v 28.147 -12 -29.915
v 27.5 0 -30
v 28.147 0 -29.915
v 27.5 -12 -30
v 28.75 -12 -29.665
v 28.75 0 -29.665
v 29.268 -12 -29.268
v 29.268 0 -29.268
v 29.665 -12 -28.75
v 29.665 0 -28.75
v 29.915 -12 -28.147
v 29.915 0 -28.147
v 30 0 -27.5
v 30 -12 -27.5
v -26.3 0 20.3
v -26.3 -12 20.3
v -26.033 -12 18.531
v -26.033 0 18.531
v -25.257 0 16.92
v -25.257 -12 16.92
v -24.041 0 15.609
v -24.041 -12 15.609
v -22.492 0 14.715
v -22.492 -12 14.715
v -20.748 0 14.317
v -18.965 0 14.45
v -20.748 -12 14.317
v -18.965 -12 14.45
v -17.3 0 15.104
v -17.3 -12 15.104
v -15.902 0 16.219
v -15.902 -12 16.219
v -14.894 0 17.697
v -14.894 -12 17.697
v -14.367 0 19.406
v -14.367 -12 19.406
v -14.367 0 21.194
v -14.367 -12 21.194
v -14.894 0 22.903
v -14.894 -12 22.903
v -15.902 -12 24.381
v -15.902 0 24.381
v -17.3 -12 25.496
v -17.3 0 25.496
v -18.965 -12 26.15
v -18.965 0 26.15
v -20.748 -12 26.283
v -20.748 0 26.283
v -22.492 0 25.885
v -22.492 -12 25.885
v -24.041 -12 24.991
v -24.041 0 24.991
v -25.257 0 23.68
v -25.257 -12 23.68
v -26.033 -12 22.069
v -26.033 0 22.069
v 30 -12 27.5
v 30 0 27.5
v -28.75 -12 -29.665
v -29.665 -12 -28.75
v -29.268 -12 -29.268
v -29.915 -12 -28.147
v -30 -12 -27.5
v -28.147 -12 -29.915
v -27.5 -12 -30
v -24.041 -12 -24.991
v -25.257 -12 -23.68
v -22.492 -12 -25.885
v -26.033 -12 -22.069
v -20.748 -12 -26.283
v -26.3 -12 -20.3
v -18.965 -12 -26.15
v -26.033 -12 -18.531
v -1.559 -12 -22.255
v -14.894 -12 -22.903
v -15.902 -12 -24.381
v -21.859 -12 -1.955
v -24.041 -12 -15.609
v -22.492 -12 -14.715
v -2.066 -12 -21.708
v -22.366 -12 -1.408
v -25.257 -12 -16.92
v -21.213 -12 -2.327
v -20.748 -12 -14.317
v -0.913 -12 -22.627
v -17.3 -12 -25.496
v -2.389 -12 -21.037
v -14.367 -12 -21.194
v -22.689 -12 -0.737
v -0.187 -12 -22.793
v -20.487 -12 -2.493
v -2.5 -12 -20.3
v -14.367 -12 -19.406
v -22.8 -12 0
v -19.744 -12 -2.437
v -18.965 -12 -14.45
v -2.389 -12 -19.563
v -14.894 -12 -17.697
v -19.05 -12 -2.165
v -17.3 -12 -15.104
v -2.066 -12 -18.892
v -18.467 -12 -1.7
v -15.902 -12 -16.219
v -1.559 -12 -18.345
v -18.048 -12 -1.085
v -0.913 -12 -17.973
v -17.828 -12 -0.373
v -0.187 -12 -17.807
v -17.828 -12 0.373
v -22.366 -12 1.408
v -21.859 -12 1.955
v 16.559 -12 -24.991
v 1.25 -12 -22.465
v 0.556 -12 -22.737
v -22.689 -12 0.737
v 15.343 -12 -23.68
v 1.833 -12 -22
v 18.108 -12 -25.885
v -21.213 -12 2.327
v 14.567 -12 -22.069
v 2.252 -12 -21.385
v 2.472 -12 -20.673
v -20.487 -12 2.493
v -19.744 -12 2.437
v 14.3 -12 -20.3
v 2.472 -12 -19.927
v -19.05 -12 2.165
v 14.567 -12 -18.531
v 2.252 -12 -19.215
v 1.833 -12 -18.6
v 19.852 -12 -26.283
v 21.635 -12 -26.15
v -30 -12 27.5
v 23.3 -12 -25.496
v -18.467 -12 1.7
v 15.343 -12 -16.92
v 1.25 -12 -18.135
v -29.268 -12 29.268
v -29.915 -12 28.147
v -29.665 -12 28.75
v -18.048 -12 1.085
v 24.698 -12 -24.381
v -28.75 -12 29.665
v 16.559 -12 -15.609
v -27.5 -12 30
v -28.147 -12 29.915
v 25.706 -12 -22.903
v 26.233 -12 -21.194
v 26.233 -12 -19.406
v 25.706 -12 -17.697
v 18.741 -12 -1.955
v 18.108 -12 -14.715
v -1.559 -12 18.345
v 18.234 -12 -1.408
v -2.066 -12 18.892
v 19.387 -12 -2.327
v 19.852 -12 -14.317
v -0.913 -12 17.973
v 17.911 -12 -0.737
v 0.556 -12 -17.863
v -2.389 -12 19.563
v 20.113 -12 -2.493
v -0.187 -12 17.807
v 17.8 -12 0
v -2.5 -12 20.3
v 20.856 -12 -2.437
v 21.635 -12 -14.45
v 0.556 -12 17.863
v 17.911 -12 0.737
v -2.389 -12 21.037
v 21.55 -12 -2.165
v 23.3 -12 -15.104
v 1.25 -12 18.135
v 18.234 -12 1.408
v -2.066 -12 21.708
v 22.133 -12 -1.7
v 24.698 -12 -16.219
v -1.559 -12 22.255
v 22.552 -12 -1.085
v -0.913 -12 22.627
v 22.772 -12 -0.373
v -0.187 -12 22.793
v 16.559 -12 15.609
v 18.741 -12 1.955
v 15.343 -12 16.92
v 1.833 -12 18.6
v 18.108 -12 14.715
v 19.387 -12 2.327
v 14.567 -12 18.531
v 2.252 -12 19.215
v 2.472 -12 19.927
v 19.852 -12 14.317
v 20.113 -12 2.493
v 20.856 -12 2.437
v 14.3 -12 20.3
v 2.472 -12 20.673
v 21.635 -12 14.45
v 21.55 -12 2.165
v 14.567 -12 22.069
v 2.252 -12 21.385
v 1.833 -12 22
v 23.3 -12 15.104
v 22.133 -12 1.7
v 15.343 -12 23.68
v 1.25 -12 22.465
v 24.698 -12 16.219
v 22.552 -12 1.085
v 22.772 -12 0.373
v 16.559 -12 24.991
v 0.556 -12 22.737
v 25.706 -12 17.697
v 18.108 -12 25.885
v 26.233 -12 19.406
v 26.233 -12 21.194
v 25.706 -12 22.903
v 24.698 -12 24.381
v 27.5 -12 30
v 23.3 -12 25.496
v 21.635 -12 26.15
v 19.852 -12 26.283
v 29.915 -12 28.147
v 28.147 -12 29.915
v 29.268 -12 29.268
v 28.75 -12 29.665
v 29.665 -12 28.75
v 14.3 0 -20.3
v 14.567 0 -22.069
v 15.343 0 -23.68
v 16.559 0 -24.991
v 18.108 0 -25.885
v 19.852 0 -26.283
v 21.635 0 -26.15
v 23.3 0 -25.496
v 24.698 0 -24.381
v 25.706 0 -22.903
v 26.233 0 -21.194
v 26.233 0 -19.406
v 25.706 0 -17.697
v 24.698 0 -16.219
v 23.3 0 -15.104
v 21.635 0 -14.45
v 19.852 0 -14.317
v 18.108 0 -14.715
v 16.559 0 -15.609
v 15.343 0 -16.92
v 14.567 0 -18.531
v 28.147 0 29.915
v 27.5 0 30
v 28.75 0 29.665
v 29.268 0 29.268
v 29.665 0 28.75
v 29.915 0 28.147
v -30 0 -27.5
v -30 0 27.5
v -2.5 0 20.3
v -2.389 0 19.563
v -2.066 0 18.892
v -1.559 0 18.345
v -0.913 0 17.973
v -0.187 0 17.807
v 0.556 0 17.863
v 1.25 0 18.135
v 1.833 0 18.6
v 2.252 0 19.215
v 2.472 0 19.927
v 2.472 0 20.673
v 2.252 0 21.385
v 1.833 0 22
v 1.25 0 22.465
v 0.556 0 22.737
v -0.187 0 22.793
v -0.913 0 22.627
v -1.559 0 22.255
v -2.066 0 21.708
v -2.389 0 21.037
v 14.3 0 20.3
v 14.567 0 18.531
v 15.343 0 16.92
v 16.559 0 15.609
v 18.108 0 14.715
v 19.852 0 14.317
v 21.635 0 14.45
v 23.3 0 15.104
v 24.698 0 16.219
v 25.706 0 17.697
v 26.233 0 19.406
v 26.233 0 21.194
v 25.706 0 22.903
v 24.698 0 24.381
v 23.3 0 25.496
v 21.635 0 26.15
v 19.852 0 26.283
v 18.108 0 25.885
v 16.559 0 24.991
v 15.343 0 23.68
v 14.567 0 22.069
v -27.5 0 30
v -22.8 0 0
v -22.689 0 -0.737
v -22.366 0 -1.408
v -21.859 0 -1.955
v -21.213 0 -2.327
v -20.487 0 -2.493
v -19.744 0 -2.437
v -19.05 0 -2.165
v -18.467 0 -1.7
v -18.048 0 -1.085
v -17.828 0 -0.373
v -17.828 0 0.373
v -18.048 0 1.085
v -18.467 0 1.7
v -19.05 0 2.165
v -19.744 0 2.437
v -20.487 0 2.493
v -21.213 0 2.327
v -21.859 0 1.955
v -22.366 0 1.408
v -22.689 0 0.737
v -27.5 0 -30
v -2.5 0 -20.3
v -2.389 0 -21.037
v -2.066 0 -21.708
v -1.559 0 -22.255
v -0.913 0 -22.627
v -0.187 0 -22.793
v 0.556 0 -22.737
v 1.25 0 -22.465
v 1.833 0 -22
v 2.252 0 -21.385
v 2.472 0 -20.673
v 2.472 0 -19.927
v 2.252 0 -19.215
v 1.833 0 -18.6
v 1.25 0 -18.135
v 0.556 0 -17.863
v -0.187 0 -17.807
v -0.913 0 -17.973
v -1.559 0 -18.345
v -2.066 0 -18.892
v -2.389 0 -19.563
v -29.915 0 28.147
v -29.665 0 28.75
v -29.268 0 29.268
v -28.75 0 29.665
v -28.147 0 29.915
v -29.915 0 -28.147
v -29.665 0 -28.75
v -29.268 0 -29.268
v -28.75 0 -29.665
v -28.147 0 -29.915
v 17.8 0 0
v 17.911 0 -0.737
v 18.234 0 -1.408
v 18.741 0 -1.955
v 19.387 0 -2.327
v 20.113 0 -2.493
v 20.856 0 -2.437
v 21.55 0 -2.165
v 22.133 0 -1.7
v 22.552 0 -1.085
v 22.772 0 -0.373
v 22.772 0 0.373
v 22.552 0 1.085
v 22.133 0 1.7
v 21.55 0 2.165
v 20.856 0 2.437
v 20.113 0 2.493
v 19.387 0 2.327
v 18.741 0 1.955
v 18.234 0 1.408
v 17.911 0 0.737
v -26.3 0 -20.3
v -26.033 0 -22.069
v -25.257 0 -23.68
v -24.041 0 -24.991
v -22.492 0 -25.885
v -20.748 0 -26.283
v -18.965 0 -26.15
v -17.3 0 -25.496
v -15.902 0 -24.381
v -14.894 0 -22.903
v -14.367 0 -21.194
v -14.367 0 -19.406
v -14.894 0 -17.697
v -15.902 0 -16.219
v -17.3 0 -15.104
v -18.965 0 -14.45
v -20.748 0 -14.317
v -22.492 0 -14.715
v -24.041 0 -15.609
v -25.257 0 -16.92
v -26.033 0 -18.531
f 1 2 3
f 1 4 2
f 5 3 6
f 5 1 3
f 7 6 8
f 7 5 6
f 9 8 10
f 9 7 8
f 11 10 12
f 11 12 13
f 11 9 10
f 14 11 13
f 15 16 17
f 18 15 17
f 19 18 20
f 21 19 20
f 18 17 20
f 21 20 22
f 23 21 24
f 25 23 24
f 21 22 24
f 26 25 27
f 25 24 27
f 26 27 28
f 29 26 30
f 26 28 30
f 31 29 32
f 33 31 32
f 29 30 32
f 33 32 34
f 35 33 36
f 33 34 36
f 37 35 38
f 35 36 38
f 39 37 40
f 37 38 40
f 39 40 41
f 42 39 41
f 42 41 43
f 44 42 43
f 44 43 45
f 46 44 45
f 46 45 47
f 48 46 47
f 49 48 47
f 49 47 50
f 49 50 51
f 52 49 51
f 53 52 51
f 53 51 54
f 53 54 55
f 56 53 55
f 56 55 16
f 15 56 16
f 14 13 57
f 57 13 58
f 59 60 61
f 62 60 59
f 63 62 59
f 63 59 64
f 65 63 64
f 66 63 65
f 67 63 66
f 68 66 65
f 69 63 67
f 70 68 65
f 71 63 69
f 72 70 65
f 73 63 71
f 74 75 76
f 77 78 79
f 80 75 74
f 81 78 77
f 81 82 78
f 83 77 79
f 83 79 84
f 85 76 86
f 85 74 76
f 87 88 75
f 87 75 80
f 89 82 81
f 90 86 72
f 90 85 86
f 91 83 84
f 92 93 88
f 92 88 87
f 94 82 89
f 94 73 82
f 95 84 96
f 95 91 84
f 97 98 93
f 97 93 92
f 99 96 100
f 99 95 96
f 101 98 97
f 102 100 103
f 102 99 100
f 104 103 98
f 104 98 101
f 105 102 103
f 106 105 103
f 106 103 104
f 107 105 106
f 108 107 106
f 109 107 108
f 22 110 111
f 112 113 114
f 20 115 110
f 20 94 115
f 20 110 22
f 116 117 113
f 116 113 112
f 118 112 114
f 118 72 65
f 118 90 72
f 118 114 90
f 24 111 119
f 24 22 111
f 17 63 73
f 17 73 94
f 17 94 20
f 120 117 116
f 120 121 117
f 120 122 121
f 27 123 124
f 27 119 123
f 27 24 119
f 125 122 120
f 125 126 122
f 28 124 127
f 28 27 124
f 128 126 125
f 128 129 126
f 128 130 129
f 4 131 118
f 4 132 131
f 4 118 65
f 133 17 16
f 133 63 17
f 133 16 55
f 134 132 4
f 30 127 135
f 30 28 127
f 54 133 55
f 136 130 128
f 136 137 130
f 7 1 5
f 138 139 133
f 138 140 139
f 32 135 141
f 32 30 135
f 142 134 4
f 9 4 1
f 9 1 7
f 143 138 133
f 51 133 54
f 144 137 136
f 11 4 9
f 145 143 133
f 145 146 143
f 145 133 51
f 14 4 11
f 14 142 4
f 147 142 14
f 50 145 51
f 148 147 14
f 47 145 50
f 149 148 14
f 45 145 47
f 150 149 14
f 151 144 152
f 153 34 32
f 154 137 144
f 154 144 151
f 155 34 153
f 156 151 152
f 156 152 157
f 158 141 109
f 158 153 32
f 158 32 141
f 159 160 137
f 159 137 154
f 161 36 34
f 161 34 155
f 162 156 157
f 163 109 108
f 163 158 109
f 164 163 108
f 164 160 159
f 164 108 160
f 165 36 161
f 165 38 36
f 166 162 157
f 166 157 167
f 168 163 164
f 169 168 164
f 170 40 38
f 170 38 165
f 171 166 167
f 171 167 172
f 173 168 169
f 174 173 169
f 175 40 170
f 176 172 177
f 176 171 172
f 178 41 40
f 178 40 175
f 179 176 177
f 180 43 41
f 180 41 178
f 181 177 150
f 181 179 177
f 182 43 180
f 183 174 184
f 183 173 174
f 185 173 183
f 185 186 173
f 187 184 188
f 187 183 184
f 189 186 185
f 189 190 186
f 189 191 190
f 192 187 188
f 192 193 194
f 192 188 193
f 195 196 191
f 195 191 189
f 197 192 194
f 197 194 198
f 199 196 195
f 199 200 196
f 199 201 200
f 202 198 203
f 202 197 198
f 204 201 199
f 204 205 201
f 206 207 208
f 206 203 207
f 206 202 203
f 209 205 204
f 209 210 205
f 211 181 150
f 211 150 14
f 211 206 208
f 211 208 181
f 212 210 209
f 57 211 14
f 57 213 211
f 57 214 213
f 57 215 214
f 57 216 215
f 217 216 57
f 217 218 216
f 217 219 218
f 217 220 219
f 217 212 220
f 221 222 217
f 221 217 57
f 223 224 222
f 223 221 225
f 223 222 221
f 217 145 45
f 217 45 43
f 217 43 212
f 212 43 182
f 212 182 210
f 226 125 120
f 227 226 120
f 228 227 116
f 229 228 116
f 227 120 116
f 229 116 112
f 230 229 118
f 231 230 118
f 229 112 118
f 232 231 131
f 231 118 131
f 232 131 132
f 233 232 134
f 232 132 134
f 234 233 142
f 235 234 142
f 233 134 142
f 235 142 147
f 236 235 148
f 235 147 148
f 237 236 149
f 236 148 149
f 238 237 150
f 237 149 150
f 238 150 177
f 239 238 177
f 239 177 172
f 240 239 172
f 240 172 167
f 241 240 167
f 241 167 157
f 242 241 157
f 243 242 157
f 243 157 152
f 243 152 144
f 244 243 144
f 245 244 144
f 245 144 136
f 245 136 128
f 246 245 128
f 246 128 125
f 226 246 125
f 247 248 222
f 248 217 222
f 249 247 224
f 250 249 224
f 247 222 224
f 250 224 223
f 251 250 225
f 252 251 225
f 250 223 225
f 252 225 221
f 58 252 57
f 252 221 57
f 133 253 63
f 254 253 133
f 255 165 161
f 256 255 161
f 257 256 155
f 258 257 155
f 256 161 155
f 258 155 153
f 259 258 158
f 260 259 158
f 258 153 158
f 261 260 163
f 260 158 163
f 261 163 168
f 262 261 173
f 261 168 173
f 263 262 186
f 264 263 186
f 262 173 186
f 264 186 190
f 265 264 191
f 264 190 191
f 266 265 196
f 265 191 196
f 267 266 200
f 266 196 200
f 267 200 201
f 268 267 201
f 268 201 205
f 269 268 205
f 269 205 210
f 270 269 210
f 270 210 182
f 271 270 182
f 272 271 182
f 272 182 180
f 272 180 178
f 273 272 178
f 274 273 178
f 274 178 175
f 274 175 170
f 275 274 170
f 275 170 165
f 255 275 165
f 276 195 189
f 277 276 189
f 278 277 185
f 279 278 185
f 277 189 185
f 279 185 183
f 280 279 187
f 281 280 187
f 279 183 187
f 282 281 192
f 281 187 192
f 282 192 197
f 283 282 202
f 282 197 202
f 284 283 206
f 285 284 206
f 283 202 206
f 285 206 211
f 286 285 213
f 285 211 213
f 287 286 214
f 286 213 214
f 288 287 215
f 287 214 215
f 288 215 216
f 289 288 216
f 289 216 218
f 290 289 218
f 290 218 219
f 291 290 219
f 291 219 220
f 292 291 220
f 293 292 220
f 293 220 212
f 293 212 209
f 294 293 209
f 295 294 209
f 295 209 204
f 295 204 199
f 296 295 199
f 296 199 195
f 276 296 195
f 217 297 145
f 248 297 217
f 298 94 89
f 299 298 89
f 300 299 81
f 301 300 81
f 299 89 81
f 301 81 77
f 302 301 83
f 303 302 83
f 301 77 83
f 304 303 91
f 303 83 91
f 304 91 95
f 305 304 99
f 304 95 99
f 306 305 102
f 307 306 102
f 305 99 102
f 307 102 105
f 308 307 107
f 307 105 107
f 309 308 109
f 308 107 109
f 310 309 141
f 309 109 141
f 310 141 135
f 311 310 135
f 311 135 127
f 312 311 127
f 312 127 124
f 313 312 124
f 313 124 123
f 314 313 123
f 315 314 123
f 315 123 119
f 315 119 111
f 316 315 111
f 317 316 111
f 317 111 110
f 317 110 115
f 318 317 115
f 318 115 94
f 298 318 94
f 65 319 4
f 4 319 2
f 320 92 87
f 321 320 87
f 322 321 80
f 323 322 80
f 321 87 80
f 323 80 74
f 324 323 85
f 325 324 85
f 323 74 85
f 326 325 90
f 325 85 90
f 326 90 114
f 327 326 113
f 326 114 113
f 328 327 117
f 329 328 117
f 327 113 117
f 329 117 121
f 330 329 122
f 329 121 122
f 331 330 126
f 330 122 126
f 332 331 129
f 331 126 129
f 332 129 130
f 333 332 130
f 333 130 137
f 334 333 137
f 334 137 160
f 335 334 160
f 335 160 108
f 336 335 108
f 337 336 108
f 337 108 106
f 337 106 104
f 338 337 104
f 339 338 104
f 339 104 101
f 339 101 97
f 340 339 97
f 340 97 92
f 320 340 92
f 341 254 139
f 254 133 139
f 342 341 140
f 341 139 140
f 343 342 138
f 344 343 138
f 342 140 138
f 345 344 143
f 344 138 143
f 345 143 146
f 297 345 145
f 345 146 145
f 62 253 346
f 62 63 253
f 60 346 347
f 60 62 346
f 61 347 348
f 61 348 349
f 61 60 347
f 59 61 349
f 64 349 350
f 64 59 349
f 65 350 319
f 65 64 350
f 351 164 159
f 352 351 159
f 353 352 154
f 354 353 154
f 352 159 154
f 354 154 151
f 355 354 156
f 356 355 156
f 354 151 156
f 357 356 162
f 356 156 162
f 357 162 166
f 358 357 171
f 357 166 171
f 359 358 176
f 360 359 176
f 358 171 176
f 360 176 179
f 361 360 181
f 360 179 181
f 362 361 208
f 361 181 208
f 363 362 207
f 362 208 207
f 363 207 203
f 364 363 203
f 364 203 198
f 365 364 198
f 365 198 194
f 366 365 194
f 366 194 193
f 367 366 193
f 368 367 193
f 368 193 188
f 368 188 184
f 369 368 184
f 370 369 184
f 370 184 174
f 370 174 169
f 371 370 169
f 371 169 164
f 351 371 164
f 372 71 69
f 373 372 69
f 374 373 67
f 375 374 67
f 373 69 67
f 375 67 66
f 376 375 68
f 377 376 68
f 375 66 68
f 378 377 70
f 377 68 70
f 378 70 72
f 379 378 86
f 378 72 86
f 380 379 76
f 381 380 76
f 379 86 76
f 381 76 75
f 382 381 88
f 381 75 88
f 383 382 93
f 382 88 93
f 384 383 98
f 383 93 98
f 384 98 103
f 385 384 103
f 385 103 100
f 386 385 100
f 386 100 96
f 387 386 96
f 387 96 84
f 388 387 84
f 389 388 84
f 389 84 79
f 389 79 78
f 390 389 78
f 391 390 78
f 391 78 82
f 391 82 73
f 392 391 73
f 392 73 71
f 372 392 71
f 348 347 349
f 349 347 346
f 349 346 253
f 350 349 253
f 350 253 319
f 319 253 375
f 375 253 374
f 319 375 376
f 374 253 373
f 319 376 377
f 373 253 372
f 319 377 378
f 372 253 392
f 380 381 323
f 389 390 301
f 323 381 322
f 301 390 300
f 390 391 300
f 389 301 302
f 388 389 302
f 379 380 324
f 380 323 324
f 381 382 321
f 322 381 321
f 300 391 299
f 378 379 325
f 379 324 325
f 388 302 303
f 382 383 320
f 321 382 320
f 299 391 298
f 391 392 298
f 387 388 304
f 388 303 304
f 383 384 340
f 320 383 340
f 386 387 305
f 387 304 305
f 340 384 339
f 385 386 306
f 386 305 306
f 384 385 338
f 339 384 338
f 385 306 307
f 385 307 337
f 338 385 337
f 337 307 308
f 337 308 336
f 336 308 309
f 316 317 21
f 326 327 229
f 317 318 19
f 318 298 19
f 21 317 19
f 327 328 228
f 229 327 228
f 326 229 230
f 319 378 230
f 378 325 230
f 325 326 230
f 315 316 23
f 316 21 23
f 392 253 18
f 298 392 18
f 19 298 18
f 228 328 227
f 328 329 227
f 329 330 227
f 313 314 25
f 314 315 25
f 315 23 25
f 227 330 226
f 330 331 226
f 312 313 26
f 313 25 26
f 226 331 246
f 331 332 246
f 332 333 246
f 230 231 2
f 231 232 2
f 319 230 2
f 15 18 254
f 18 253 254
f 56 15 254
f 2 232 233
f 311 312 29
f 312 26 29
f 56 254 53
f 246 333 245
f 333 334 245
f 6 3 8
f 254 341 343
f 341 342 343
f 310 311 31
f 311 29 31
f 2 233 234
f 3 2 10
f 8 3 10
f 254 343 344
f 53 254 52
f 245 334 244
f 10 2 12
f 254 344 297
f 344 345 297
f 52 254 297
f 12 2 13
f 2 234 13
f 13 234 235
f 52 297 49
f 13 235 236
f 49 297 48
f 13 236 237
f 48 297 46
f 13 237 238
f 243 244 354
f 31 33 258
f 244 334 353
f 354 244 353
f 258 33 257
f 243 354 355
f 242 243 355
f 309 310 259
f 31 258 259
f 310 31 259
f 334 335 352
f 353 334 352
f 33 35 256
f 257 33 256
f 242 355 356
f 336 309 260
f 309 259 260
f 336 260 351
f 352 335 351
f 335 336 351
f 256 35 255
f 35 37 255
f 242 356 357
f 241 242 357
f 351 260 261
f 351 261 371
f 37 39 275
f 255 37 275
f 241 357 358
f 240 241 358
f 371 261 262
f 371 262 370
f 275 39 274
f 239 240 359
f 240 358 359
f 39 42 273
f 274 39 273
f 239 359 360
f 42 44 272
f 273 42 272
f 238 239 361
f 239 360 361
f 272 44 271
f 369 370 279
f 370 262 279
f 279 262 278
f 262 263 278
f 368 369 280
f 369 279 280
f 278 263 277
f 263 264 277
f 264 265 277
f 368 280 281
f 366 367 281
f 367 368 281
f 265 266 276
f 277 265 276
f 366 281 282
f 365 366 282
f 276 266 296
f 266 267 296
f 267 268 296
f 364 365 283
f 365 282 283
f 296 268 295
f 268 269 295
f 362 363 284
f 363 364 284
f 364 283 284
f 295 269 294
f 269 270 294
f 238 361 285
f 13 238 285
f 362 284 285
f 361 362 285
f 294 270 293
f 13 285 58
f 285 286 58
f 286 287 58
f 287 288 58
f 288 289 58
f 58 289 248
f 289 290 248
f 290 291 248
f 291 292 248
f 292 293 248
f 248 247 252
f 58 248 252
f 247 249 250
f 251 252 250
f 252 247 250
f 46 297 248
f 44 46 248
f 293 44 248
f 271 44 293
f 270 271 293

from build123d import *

# Parameters (mm, degrees)
F0_W     = 60
F0_H     = 60
F1_DEPTH = 12
F2_D     = 5
F3_D     = 12
F4_R     = 2.5


with BuildPart() as f1:
    # F0 (on Front) → F1 (new body)
    with BuildSketch(Plane.XZ):
        Rectangle(F0_W, F0_H)
    extrude(amount=F1_DEPTH)

    # F2 (through all)
    with Locations(Plane(origin=(0, 0, 0), x_dir=(1, 0, 0), z_dir=(0, 1, 0))):
        with Locations((0, 20.3), (0, -20.3), (-20.3, 0), (20.3, 0)):
            Hole(F2_D / 2)

    # F3 (through all)
    with Locations(Plane(origin=(0, 0, 0), x_dir=(1, 0, 0), z_dir=(0, 1, 0))):
        with Locations((-20.3, 20.3), (20.3, 20.3), (20.3, -20.3), (-20.3, -20.3)):
            Hole(F3_D / 2)

    # F4
    f4_edges = [f1.edges().sort_by_distance(p)[0] for p in [
        (30, -6, 30),
        (30, -6, -30),
        (-30, -6, -30),
        (-30, -6, 30),
    ]]
    fillet(f4_edges, radius=F4_R)


solid = f1.part
